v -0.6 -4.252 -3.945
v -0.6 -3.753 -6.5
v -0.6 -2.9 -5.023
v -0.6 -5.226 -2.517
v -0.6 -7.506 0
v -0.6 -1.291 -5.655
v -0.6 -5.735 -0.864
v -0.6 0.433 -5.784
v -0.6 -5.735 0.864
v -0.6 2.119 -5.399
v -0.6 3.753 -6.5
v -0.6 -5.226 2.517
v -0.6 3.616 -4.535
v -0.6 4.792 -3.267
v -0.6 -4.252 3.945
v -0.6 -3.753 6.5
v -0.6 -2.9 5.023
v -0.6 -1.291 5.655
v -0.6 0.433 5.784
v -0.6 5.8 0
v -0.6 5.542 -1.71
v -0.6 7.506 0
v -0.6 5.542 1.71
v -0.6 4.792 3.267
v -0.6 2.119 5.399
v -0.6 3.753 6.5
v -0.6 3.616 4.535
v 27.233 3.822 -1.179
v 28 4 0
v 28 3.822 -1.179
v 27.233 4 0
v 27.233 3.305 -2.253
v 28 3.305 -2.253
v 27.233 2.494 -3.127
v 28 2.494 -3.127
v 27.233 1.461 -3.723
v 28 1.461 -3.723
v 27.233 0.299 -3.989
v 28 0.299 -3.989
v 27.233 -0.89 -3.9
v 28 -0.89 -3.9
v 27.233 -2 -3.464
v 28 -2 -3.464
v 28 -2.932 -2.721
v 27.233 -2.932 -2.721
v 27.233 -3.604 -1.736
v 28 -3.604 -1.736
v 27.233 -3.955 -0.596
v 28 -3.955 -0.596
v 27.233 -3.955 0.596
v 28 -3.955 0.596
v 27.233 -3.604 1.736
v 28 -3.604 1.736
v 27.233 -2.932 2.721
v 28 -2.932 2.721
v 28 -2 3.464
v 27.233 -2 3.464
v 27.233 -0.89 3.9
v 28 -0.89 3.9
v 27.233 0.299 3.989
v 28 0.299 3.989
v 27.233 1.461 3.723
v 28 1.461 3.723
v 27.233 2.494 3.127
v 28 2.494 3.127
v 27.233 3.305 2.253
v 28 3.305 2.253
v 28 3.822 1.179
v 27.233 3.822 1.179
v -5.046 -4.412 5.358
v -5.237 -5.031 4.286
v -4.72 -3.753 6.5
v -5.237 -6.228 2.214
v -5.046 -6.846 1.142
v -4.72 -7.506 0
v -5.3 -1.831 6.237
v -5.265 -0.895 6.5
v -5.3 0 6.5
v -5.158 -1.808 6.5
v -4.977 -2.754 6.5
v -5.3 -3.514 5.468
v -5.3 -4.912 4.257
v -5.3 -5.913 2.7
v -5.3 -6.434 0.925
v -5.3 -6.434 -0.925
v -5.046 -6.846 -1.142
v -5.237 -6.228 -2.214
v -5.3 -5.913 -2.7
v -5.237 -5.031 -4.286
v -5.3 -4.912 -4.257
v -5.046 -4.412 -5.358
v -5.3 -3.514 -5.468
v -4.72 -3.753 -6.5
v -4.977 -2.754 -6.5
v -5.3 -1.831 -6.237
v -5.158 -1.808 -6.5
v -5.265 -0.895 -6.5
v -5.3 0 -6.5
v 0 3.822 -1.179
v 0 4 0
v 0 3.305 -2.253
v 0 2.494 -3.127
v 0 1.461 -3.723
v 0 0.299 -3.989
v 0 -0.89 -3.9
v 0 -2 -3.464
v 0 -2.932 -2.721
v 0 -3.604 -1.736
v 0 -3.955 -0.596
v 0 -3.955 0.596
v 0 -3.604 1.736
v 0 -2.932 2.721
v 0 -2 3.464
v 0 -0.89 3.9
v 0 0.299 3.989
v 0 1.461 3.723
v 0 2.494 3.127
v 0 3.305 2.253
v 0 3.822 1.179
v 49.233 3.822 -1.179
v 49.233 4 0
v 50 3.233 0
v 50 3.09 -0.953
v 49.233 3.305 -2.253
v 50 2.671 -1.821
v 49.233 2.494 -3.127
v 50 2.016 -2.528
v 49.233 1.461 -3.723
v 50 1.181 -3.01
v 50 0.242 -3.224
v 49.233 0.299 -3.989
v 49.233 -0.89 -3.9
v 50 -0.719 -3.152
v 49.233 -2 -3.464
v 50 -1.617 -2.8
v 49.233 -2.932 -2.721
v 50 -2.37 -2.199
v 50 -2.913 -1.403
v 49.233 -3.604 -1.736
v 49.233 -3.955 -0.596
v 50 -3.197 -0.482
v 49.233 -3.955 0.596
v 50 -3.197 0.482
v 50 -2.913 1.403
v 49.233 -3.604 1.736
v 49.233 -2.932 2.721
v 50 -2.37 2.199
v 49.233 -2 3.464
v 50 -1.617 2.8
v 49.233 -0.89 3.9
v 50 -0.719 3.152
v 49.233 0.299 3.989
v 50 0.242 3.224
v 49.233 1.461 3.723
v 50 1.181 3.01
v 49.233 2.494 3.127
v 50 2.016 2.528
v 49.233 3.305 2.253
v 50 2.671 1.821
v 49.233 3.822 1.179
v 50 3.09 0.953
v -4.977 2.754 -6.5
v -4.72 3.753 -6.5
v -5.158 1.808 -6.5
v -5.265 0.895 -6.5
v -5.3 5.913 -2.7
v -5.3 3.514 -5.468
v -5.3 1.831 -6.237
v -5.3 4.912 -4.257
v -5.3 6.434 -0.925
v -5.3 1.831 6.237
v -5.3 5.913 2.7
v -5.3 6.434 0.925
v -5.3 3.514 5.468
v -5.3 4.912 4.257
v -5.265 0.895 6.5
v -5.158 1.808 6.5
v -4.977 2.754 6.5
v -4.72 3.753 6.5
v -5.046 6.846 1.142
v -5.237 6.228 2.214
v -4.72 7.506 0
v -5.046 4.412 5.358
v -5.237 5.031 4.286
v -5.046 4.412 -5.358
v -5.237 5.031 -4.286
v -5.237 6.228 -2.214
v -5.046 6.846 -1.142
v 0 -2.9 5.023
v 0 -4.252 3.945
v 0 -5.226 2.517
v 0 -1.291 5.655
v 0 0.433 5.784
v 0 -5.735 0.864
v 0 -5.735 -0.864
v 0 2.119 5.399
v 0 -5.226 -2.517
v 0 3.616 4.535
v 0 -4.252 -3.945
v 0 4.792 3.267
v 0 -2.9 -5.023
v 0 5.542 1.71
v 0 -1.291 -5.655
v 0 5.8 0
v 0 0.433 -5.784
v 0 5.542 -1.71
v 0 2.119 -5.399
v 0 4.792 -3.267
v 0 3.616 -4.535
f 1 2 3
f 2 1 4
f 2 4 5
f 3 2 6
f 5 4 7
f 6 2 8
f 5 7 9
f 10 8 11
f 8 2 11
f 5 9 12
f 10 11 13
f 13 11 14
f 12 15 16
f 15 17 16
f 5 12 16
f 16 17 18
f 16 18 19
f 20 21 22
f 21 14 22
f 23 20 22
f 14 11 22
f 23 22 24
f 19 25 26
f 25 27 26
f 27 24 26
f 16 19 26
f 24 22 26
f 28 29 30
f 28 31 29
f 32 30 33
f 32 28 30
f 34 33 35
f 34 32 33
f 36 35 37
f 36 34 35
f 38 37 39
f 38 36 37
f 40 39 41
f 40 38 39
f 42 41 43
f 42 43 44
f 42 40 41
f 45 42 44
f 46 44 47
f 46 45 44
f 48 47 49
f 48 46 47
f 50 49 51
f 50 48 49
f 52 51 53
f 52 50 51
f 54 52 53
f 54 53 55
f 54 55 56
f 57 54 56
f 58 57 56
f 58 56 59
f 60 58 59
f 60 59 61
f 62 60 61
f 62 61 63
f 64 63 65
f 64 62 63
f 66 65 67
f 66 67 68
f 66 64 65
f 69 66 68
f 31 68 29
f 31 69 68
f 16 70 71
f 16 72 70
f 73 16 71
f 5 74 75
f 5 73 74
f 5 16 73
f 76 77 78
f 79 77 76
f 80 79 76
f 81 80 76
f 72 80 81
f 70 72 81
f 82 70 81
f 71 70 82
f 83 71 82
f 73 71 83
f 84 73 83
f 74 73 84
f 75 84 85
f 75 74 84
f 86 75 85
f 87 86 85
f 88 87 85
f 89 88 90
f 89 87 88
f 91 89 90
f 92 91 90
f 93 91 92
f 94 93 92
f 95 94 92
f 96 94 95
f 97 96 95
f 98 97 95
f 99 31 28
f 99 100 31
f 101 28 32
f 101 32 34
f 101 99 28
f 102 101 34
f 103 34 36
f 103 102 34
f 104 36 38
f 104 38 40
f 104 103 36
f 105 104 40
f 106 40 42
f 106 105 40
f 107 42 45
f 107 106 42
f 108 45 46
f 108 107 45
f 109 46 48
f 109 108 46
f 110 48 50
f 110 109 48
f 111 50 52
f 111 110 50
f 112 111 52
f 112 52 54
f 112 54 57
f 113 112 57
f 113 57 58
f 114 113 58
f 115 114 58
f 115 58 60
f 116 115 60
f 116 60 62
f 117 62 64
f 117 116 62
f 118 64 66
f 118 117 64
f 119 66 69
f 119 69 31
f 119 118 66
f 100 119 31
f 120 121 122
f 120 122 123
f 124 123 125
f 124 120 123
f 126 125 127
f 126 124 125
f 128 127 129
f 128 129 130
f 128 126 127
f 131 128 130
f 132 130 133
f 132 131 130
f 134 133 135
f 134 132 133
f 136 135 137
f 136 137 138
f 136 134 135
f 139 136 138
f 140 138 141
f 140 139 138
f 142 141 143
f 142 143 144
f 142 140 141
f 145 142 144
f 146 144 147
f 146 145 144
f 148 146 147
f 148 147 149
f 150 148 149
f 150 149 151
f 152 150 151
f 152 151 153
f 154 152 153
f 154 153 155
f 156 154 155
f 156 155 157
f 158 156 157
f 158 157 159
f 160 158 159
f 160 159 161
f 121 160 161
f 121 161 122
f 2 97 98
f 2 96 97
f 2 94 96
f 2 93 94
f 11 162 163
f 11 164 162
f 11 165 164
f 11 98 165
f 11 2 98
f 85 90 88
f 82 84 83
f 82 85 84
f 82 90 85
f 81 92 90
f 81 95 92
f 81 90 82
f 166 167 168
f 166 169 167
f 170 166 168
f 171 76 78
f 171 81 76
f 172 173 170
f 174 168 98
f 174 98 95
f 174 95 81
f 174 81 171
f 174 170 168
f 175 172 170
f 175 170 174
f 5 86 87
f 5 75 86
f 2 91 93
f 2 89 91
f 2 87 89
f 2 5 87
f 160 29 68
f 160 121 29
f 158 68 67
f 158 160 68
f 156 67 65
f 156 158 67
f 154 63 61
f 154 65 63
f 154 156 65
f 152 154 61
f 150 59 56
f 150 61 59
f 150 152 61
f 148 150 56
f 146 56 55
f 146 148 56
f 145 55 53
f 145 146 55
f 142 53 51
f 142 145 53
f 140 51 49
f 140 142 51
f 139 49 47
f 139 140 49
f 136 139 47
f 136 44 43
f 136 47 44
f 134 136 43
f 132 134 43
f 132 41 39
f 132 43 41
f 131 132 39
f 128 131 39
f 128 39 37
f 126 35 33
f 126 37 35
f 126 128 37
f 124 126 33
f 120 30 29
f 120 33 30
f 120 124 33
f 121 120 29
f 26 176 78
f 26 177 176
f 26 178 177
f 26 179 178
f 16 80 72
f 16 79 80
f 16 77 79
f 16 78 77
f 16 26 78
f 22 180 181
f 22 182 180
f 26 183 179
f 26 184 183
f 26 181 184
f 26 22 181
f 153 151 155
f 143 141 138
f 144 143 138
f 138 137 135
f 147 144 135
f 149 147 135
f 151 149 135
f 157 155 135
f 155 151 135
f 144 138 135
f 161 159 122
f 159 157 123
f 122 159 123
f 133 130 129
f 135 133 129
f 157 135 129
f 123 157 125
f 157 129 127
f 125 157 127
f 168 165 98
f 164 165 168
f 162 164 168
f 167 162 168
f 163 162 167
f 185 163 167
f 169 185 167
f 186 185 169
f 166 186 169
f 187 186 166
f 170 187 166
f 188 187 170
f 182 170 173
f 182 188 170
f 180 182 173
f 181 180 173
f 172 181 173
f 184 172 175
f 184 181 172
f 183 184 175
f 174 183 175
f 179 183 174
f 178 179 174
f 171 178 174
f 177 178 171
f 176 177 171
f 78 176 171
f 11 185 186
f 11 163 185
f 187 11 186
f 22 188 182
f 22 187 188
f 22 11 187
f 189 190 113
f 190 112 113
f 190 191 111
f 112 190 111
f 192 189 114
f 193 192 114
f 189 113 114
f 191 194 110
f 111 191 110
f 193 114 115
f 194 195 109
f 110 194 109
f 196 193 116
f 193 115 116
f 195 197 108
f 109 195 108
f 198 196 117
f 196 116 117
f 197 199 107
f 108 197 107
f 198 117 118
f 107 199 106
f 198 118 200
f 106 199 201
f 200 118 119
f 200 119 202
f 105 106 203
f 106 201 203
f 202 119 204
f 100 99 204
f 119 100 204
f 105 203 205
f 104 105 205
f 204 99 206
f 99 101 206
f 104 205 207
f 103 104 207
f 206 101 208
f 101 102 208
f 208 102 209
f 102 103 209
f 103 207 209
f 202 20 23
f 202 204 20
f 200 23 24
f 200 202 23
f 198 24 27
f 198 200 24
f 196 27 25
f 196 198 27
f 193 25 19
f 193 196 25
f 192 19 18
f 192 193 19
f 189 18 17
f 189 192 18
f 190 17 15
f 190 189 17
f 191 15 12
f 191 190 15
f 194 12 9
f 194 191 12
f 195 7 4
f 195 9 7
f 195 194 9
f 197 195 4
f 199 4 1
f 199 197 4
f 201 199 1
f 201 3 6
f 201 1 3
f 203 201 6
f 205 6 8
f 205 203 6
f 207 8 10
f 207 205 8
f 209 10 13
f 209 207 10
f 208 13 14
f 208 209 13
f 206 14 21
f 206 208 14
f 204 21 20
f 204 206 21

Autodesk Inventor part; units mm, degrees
ref_plane "YZ Plane" through (0, 0, 0) normal (1, 0, 0) x (0, 1, 0)
ref_plane "XZ Plane" through (0, 0, 0) normal (0, 1, 0) x (-1, 0, 0)
sketch "Skizze1" plane through (0, 0, 0) normal (0, 0, 1) x (1, 0, 0)
  line L0 (0, 5.8) -> (0, 4)
  line L1 (28, 4) -> (50, 4)
  line L2 (50, 4) -> (50, 0)
  line L3 (50, 0) -> (-0.6001, 0)
  line L4 (-10.7201, 0) -> (60.12, 0) projected
  line L5 (-0.6001, 0) -> (-0.6001, 5.8)
  line L6 (-0.6001, 5.8) -> (0, 5.8)
  line L7 (28, 4) -> (27.2331, 4)
  line L8 (27.2331, 4) -> (0, 4)
  line L9 (0, -1.16) -> (0, 6.96) projected
  dimension "d0" = 50
  dimension "d1" = 22
  dimension "d2" = 8
  dimension "d9" = 0.6001
  dimension "d10" = 11.6
  dimension "d13" = 0.7669
  dimension "d14" = 8
revolve "Körper" add sketch "Skizze1" angle 360 about axis through (50, 0, 0) along (-1, 0, 0)
sketch "Skizze2" plane through (-0.6001, 0, 0) normal (-1, 0, 0) x (0, 0, 1)
  line L0 (0, 7.5056) -> (6.5, 3.7528)
  line L1 (6.5, 3.7528) -> (6.5, -3.7528)
  line L2 (6.5, -3.7528) -> (0, -7.5056)
  line L3 (0, -7.5056) -> (-6.5, -3.7528)
  line L4 (-6.5, -3.7528) -> (-6.5, 3.7528)
  line L5 (-6.5, 3.7528) -> (0, 7.5056)
  point P0 (0, 0)
  point P1 (0, 0)
  dimension "d11" = 13
extrude "Kopf" add sketch "Skizze2" along normal blind 4.7
sketch "Skizze4" plane through (0, 0, 0) normal (0, 0, 1) x (1, 0, 0)
  line L0 (-5.3001, 6.5) -> (-5.3001, 7.5056)
  line L1 (-5.3001, 7.5056) -> (-4.7195, 7.5056)
  line L2 (-4.7195, 7.5056) -> (-5.3001, 6.5)
  line L3 (-6.2401, 0) -> (0.3399, 0) projected
  line L4 (-0.6001, 7.5056) -> (-5.3001, 7.5056) projected
  line L5 (-5.3001, 3.7528) -> (-5.3001, 7.5056) projected
  dimension "d5" = 30
  dimension "d19" = 13
revolve "Fase1" cut sketch "Skizze4" angle 360 about axis through (-10, 0, 0) along (1, 0, 0)
thread "Gewinde" size "M8x1.25" class "6g" standard "ISO Metric profile" length 22
chamfer "Fase2" distance 0.7668 distance2 0.7669 1 edges at (50, -4, 0) measured on face at (50, 1.2946, -0.3191)
ref_plane "Work Plane1" through (1.525, 0, 0) normal (0, 0, 1) x (1, 0, 0)
equation "\"d0\" = NLG"
equation "\"d1\" = GEL"
equation "\"d2\" = GD"
equation "\"d10\" = SD2"
equation "\"d14\" = BDM"
equation "\"d11\" = SW"
equation "\"d3\" = KOH - SD"
equation "\"d5\" = ANG1"
equation "\"d19\" = SW0"
equation "\"d15\" = GEL"
equation "\"d6\" = -0.5 * SPD + 0.5 * GD"
equation "\"NLG\" = 50"
equation "\"GD\" = NND"
equation "\"BDM\" = NND"
equation "\"KOH\" = 5.3"
equation "\"GEL\" = 22"
equation "\"SW\" = 13"
equation "\"SW0\" = SW"
equation "\"SPD\" = NND - 1.2269 * PTC"
equation "\"SD2\" = 11.6"
equation "\"SD\" = 0.6"
equation "\"ANG1\" = 30deg"
equation "\"GAL\" = 0.61345 * PTC"
equation "\"GUL\" = 0.61345 * PTC"
equation "\"RR\" = 0.4"
equation "\"GD1\" = THREADDIA - 1.2269 * PTC"
equation "\"THREADDIA\" = 8"
equation "\"TOA\" = 30deg"
equation "\"PTC\" = 1.25"
equation "\"NND\" = 8"
equation "\"E0\" = 1.155 * SW"
properties part number "DIN 931-1 - M8 x 50" material "Stahl, weich"
